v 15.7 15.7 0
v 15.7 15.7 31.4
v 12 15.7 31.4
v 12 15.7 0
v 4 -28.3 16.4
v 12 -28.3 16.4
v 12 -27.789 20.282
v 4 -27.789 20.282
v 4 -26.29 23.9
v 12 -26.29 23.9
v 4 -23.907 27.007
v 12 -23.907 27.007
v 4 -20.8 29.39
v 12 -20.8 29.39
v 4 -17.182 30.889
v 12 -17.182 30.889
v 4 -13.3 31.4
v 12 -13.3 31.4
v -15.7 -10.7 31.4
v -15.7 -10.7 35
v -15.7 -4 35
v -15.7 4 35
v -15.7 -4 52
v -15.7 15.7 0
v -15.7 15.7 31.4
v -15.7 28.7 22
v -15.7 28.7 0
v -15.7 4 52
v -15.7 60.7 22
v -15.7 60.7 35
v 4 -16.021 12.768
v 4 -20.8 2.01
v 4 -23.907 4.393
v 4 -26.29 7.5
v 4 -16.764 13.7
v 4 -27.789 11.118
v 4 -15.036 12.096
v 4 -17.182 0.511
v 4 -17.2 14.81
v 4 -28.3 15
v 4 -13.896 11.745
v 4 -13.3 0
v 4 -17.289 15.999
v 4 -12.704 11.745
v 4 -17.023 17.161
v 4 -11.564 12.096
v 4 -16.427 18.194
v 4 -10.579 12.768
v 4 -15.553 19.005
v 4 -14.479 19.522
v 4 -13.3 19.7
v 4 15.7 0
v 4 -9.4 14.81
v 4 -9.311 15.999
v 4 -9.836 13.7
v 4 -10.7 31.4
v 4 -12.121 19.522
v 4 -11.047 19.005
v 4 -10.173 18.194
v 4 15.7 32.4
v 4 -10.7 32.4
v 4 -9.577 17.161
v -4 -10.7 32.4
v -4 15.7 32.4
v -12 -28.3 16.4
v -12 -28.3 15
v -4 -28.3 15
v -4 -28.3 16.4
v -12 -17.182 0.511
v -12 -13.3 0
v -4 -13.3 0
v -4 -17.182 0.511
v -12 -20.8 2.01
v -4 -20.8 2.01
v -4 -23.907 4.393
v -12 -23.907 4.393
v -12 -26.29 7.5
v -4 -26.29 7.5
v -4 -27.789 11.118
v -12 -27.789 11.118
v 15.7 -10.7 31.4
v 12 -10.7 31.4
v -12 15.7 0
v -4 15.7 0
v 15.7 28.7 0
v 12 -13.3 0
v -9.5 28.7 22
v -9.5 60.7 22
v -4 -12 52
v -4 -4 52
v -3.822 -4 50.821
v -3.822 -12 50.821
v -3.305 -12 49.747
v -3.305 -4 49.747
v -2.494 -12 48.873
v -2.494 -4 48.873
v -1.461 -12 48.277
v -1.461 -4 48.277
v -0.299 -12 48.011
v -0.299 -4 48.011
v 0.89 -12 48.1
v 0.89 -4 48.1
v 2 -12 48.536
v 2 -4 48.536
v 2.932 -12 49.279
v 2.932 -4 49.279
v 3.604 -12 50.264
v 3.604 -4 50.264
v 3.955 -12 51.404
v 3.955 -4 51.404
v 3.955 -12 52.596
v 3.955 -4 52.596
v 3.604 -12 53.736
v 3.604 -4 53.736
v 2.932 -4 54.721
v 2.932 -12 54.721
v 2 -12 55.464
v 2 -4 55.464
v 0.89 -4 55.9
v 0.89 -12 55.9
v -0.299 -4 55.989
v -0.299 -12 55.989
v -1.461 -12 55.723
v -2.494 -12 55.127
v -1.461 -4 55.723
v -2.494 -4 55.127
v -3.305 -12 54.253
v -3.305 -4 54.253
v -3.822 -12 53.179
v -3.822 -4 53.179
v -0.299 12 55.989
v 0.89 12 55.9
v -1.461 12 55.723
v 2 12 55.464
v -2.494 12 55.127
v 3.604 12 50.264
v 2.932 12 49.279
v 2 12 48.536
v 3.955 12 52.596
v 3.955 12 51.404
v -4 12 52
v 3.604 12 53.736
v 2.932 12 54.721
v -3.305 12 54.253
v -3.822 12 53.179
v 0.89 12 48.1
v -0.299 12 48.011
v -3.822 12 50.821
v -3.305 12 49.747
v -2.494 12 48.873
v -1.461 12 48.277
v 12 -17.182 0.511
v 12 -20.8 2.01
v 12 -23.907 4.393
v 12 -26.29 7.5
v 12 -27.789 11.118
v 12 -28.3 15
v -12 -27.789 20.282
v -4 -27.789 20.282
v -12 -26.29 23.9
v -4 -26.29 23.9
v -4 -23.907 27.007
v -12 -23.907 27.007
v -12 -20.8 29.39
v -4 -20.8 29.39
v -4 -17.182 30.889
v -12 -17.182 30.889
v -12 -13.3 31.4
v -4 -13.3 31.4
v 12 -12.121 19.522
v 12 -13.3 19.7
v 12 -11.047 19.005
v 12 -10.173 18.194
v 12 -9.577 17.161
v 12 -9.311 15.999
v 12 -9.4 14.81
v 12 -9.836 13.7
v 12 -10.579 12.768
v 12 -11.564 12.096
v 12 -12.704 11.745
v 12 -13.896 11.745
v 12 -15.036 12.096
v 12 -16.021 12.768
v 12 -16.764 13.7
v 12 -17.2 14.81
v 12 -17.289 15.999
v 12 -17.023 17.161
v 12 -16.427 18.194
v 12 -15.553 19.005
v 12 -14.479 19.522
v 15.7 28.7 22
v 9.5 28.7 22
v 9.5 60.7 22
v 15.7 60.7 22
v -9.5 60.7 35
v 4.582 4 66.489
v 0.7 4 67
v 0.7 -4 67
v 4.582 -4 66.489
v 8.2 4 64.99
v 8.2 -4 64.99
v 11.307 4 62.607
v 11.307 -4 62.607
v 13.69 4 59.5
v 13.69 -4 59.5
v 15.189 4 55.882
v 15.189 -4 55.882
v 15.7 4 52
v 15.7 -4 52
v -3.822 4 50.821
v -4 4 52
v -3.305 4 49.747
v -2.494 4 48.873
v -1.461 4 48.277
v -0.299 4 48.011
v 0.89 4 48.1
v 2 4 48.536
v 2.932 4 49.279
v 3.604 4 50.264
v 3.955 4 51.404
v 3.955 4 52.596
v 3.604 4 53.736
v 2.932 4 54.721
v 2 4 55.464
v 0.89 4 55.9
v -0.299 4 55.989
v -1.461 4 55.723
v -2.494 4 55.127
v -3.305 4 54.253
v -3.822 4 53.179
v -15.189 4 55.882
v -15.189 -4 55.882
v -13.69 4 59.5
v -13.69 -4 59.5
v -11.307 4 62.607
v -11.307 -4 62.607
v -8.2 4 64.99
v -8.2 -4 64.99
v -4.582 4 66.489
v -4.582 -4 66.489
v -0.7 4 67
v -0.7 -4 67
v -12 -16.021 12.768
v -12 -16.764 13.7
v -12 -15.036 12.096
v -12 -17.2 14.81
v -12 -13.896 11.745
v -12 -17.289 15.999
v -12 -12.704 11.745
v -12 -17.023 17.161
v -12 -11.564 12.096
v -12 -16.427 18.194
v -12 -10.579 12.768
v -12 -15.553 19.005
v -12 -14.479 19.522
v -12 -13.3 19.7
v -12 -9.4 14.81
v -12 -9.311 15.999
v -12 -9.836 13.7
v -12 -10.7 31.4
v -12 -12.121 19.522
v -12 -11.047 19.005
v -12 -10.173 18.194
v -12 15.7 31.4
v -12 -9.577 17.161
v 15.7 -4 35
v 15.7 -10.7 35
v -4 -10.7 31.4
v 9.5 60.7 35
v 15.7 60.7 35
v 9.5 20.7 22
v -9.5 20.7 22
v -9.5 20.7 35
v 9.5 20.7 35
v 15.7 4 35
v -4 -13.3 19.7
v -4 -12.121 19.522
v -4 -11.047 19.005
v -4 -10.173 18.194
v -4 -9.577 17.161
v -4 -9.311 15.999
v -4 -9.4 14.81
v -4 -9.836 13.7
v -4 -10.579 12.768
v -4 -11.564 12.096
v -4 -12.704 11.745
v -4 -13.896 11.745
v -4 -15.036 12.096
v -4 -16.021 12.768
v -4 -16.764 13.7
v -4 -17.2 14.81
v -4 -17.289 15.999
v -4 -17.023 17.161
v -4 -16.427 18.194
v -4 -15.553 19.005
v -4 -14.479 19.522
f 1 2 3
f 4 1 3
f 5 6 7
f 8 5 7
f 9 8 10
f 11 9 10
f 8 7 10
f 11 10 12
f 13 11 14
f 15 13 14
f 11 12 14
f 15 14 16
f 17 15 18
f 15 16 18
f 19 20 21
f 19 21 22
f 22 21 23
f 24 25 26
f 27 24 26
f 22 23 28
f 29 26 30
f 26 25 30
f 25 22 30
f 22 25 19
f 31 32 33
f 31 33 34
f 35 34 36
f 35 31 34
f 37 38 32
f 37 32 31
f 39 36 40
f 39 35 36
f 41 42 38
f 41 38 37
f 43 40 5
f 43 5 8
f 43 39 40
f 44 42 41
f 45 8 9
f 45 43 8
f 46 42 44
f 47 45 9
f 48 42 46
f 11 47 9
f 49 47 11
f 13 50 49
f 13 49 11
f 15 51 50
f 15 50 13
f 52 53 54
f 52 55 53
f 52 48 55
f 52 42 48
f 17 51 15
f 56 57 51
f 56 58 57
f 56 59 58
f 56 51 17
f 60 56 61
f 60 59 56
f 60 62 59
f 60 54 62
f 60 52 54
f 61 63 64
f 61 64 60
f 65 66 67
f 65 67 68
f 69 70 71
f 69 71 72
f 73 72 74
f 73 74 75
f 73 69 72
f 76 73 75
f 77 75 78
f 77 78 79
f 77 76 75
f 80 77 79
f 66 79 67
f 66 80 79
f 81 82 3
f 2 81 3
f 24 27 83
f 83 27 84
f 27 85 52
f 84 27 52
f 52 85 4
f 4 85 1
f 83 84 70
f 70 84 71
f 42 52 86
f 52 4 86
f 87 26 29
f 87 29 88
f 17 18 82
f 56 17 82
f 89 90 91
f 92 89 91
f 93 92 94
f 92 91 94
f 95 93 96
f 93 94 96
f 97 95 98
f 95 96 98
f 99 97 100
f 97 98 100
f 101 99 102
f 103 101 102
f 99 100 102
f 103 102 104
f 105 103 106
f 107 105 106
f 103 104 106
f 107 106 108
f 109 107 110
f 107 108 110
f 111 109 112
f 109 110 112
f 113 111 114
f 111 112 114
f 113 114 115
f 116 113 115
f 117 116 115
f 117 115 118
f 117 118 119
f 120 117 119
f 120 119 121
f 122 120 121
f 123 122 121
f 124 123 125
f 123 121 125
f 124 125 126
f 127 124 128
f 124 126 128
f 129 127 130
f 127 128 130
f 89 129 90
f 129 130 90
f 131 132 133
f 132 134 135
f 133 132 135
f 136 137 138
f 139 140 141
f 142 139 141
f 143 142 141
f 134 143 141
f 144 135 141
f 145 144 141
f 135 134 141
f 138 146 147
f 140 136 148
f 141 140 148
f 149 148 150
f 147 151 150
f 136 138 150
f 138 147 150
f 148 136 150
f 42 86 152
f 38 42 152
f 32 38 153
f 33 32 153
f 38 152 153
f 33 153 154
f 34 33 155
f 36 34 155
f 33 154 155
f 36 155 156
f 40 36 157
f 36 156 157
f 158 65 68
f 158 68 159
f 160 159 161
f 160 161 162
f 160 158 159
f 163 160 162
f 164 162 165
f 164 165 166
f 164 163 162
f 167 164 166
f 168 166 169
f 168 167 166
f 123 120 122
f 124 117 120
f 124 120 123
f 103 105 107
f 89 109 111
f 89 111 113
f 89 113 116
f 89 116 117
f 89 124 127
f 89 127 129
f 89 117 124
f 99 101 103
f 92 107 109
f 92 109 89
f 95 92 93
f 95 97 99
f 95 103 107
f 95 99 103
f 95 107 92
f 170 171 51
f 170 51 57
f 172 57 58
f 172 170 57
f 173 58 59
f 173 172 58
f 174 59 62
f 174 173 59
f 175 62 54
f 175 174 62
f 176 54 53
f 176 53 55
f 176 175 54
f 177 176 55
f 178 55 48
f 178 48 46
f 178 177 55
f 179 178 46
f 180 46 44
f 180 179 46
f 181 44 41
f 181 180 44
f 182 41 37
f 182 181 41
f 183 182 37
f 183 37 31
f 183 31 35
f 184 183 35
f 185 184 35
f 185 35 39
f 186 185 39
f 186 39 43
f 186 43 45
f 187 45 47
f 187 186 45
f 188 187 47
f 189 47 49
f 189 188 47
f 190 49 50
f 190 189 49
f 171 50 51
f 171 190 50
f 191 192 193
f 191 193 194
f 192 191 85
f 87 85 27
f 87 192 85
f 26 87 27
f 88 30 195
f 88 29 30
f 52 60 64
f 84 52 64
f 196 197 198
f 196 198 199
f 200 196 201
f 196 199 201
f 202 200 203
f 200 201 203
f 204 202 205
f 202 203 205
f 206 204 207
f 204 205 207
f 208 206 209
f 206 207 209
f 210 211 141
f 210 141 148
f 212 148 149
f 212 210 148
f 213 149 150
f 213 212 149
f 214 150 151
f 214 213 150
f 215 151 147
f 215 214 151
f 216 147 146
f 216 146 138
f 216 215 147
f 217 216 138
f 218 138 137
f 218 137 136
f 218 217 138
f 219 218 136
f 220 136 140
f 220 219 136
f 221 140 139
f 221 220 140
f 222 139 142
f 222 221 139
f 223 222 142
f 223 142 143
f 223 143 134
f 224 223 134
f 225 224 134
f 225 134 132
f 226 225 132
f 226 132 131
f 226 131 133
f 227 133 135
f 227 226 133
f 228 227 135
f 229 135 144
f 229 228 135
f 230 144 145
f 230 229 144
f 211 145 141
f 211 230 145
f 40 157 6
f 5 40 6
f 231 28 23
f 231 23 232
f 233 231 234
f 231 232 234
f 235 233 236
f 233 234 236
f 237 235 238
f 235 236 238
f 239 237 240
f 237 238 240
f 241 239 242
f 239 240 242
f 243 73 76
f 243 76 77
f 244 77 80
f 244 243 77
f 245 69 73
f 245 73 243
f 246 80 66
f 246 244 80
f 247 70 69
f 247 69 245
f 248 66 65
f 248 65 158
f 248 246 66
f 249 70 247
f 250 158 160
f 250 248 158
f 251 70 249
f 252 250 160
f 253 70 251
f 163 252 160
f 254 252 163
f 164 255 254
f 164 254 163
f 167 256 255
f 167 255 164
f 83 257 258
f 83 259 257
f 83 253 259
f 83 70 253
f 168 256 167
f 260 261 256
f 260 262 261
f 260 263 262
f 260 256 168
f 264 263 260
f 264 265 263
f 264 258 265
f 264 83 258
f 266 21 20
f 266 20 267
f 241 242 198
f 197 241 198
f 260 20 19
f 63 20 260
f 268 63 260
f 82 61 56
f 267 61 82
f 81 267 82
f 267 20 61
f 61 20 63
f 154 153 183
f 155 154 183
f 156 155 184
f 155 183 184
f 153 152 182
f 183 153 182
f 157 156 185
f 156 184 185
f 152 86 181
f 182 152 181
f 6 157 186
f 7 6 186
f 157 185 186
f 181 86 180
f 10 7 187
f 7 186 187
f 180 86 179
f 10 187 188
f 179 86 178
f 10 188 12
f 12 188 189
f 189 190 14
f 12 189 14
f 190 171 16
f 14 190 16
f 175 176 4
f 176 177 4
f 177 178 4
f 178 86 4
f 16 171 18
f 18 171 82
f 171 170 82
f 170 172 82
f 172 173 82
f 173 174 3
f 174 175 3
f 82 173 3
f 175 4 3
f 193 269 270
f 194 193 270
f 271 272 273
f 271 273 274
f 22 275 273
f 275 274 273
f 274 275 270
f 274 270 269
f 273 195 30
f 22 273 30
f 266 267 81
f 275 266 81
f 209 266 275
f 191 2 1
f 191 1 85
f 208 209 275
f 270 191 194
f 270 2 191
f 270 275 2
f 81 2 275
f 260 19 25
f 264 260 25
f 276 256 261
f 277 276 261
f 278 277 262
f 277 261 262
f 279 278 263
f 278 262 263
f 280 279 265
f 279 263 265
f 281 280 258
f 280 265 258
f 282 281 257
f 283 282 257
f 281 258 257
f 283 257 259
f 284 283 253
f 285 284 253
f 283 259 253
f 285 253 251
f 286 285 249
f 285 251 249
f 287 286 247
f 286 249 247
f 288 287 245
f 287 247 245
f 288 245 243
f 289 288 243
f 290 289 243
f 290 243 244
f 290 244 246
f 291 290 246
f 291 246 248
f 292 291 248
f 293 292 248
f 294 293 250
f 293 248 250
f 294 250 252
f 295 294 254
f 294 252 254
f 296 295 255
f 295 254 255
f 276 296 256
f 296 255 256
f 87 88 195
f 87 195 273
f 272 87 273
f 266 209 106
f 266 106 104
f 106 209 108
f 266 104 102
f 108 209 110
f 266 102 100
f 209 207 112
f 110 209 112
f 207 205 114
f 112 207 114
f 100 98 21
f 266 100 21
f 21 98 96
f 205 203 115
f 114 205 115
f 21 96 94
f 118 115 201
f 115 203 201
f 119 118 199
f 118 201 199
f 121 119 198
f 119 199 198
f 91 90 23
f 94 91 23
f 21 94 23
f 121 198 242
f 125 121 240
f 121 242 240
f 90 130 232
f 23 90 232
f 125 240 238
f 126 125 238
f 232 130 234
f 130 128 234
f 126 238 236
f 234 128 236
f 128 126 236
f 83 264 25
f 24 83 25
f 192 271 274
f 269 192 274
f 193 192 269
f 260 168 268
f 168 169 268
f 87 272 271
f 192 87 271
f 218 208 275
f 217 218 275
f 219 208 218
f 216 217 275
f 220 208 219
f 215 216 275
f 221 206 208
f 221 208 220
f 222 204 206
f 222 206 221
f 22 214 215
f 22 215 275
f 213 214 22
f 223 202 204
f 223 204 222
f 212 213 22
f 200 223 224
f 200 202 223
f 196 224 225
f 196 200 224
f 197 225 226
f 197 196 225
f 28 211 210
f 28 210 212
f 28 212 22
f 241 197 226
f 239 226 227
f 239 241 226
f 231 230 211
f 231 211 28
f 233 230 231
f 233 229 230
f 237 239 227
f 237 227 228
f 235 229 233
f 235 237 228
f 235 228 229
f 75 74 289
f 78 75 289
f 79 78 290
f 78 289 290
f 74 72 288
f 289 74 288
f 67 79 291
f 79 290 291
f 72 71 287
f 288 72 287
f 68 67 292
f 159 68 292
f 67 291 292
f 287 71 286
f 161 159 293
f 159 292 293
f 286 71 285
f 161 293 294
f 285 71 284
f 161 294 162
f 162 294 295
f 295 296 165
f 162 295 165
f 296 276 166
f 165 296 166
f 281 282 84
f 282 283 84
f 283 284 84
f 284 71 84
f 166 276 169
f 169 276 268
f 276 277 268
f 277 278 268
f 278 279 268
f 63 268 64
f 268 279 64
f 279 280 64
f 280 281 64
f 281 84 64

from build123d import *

# Parameters (mm, degrees)
SKETCH4_W            = 31.4
SKETCH4_H            = 31.4
SKETCH4_W_2          = 25.4
SKETCH4_H_2          = 25.4
BOSS_EXTRUDE3_DEPTH  = 30
SKETCH5_W            = 31.4
SKETCH5_H            = 31.4
BOSS_EXTRUDE4_DEPTH  = 5
SKETCH6_W            = 31.4
SKETCH6_H            = 8
BOSS_EXTRUDE5_DEPTH  = 5
BOSS_EXTRUDE6_DEPTH  = 8
SKETCH8_R            = 4
BOSS_EXTRUDE7_DEPTH  = 8
SKETCH9_W            = 31.4
SKETCH9_H            = 10
BOSS_EXTRUDE8_DEPTH  = 5
SKETCH10_W           = 31.4
SKETCH10_H           = 10
BOSS_EXTRUDE9_DEPTH  = 13
SKETCH11_W           = 6.2
SKETCH11_H           = 10
BOSS_EXTRUDE10_DEPTH = 40
BOSS_EXTRUDE11_DEPTH = 3
SKETCH13_W           = 31.4
SKETCH13_H           = 31.4
CUT_EXTRUDE1_DEPTH   = 31.4
SKETCH15_W           = 31.4
SKETCH15_H           = 13
BOSS_EXTRUDE12_DEPTH = 12
SKETCH17_W           = 8
SKETCH17_H           = 31.4
BOSS_EXTRUDE13_DEPTH = 10
SKETCH18_R           = 4
BOSS_EXTRUDE14_DEPTH = 8
SKETCH19_W           = 3.6
SKETCH19_H           = 5
CUT_EXTRUDE2_DEPTH   = 31.4
SKETCH20_W           = 8
SKETCH20_H           = 1
CUT_EXTRUDE3_DEPTH   = 26.4


with BuildPart() as part:
    # Sketch4 → Boss-Extrude3 (new body)
    with BuildSketch(Plane.XY):
        Rectangle(SKETCH4_W, SKETCH4_H)
        Rectangle(SKETCH4_W_2, SKETCH4_H_2, mode=Mode.SUBTRACT)
    extrude(amount=BOSS_EXTRUDE3_DEPTH)

    # Sketch5 → Boss-Extrude4 (add)
    with BuildSketch(Plane.XY.offset(30)):
        Rectangle(SKETCH5_W, SKETCH5_H)
    extrude(amount=BOSS_EXTRUDE4_DEPTH)

    # Sketch6 → Boss-Extrude5 (add)
    with BuildSketch(Plane.XY.offset(35)):
        Rectangle(SKETCH6_W, SKETCH6_H)
    extrude(amount=BOSS_EXTRUDE5_DEPTH)

    # Sketch7 → Boss-Extrude6 (add)
    with BuildSketch(Plane.XZ.offset(4)):
        with BuildLine():
            Line((-15.7, 40), (-15.7, 52))
            ThreePointArc((-15.7, 52), (-11.306601718, 62.606601718), (-0.7, 67))
            Line((-0.7, 67), (0.7, 67))
            ThreePointArc((0.7, 67), (11.306601718, 62.606601718), (15.7, 52))
            Line((15.7, 52), (15.7, 40))
            Line((15.7, 40), (-15.7, 40))
        make_face()
    extrude(amount=-BOSS_EXTRUDE6_DEPTH)

    # Sketch8 → Boss-Extrude7 (add)
    with BuildSketch(Plane.XZ.offset(4)):
        with Locations(Location((0, 52, 0), (0, 0, 180))):
            Circle(SKETCH8_R)
    boss_extrude7 = extrude(amount=BOSS_EXTRUDE7_DEPTH)

    # Mirror1: Boss-Extrude7 across plane
    add(boss_extrude7.mirror(Plane.ZX))

    # Sketch9 → Boss-Extrude8 (add)
    with BuildSketch(Plane(origin=(0, 15.7, 0), x_dir=(1, 0, 0), z_dir=(0, 1, 0))):
        with Locations((0, -27)):
            Rectangle(SKETCH9_W, SKETCH9_H)
    extrude(amount=BOSS_EXTRUDE8_DEPTH)

    # Sketch10 → Boss-Extrude9 (add)
    with BuildSketch(Plane(origin=(0, 15.7, 0), x_dir=(1, 0, 0), z_dir=(0, 1, 0))):
        with Locations((0, -17)):
            Rectangle(SKETCH10_W, SKETCH10_H)
    extrude(amount=BOSS_EXTRUDE9_DEPTH)

    # Sketch11 → Boss-Extrude10 (add)
    with BuildSketch(Plane(origin=(0, 20.7, 0), x_dir=(1, 0, 0), z_dir=(0, 1, 0))):
        with Locations((-12.6, -27)):
            Rectangle(SKETCH11_W, SKETCH11_H)
        with Locations((12.6, -27)):
            Rectangle(SKETCH11_W, SKETCH11_H)
    extrude(amount=BOSS_EXTRUDE10_DEPTH)

    # Sketch12 → Boss-Extrude11 (add)
    with BuildSketch(Plane.XY.offset(32)):
        Polygon((-15.7, 60.7), (-9.5, 60.7), (-9.5, 20.7), (9.5, 20.7), (9.5, 60.7), (15.7, 60.7), (15.7, 15.7), (-15.7, 15.7), align=None)
    extrude(amount=BOSS_EXTRUDE11_DEPTH)

    # Sketch13 → Cut-Extrude1 (cut)
    with BuildSketch(Plane.ZY.offset(15.7)):
        with Locations((15.7, 0)):
            Rectangle(SKETCH13_W, SKETCH13_H)
    extrude(amount=-CUT_EXTRUDE1_DEPTH, mode=Mode.SUBTRACT)

    # Sketch15 → Boss-Extrude12 (add)
    with BuildSketch(Plane(origin=(0, 0, 12), x_dir=(-1, 0, 0), z_dir=(0, 0, -1))):
        with Locations((0, 22.2)):
            Rectangle(SKETCH15_W, SKETCH15_H)
    extrude(amount=BOSS_EXTRUDE12_DEPTH)

    # Sketch17 → Boss-Extrude13 (add)
    with BuildSketch(Plane.XZ.offset(-15.7)):
        with Locations((-8, 15.7)):
            Rectangle(SKETCH17_W, SKETCH17_H)
    boss_extrude13 = extrude(amount=BOSS_EXTRUDE13_DEPTH)

    # Sketch18 → Boss-Extrude14 (add)
    with BuildSketch(Plane.ZY.offset(12)):
        with BuildLine():
            Line((31.4, 5.7), (0, 5.7))
            Line((0, 5.7), (0, -13.3))
            ThreePointArc((0, -13.3), (4.393398282, -23.906601718), (15, -28.3))
            Line((15, -28.3), (16.4, -28.3))
            ThreePointArc((16.4, -28.3), (27.006601718, -23.906601718), (31.4, -13.3))
            Line((31.4, -13.3), (31.4, 5.7))
        make_face()
        with Locations((15.7, -13.3)):
            Circle(SKETCH18_R, mode=Mode.SUBTRACT)
    boss_extrude14 = extrude(amount=-BOSS_EXTRUDE14_DEPTH)

    # Mirror3: Boss-Extrude13, Boss-Extrude14 across plane
    add(boss_extrude13.mirror(Plane(origin=(0, 0, 0), x_dir=(0, 0, 1), z_dir=(1, 0, 0))))
    add(boss_extrude14.mirror(Plane(origin=(0, 0, 0), x_dir=(0, 0, 1), z_dir=(1, 0, 0))))

    # Sketch19 → Cut-Extrude2 (cut)
    with BuildSketch(Plane(origin=(15.7, 0, 0), x_dir=(0, 0, -1), z_dir=(1, 0, 0))):
        with Locations((-33.2, -13.2)):
            Rectangle(SKETCH19_W, SKETCH19_H)
    extrude(amount=-CUT_EXTRUDE2_DEPTH, mode=Mode.SUBTRACT)

    # Sketch20 → Cut-Extrude3 (cut)
    with BuildSketch(Plane.XZ.offset(10.7)):
        with Locations((0, 31.9)):
            Rectangle(SKETCH20_W, SKETCH20_H)
    extrude(amount=-CUT_EXTRUDE3_DEPTH, mode=Mode.SUBTRACT)


solid = part.part
